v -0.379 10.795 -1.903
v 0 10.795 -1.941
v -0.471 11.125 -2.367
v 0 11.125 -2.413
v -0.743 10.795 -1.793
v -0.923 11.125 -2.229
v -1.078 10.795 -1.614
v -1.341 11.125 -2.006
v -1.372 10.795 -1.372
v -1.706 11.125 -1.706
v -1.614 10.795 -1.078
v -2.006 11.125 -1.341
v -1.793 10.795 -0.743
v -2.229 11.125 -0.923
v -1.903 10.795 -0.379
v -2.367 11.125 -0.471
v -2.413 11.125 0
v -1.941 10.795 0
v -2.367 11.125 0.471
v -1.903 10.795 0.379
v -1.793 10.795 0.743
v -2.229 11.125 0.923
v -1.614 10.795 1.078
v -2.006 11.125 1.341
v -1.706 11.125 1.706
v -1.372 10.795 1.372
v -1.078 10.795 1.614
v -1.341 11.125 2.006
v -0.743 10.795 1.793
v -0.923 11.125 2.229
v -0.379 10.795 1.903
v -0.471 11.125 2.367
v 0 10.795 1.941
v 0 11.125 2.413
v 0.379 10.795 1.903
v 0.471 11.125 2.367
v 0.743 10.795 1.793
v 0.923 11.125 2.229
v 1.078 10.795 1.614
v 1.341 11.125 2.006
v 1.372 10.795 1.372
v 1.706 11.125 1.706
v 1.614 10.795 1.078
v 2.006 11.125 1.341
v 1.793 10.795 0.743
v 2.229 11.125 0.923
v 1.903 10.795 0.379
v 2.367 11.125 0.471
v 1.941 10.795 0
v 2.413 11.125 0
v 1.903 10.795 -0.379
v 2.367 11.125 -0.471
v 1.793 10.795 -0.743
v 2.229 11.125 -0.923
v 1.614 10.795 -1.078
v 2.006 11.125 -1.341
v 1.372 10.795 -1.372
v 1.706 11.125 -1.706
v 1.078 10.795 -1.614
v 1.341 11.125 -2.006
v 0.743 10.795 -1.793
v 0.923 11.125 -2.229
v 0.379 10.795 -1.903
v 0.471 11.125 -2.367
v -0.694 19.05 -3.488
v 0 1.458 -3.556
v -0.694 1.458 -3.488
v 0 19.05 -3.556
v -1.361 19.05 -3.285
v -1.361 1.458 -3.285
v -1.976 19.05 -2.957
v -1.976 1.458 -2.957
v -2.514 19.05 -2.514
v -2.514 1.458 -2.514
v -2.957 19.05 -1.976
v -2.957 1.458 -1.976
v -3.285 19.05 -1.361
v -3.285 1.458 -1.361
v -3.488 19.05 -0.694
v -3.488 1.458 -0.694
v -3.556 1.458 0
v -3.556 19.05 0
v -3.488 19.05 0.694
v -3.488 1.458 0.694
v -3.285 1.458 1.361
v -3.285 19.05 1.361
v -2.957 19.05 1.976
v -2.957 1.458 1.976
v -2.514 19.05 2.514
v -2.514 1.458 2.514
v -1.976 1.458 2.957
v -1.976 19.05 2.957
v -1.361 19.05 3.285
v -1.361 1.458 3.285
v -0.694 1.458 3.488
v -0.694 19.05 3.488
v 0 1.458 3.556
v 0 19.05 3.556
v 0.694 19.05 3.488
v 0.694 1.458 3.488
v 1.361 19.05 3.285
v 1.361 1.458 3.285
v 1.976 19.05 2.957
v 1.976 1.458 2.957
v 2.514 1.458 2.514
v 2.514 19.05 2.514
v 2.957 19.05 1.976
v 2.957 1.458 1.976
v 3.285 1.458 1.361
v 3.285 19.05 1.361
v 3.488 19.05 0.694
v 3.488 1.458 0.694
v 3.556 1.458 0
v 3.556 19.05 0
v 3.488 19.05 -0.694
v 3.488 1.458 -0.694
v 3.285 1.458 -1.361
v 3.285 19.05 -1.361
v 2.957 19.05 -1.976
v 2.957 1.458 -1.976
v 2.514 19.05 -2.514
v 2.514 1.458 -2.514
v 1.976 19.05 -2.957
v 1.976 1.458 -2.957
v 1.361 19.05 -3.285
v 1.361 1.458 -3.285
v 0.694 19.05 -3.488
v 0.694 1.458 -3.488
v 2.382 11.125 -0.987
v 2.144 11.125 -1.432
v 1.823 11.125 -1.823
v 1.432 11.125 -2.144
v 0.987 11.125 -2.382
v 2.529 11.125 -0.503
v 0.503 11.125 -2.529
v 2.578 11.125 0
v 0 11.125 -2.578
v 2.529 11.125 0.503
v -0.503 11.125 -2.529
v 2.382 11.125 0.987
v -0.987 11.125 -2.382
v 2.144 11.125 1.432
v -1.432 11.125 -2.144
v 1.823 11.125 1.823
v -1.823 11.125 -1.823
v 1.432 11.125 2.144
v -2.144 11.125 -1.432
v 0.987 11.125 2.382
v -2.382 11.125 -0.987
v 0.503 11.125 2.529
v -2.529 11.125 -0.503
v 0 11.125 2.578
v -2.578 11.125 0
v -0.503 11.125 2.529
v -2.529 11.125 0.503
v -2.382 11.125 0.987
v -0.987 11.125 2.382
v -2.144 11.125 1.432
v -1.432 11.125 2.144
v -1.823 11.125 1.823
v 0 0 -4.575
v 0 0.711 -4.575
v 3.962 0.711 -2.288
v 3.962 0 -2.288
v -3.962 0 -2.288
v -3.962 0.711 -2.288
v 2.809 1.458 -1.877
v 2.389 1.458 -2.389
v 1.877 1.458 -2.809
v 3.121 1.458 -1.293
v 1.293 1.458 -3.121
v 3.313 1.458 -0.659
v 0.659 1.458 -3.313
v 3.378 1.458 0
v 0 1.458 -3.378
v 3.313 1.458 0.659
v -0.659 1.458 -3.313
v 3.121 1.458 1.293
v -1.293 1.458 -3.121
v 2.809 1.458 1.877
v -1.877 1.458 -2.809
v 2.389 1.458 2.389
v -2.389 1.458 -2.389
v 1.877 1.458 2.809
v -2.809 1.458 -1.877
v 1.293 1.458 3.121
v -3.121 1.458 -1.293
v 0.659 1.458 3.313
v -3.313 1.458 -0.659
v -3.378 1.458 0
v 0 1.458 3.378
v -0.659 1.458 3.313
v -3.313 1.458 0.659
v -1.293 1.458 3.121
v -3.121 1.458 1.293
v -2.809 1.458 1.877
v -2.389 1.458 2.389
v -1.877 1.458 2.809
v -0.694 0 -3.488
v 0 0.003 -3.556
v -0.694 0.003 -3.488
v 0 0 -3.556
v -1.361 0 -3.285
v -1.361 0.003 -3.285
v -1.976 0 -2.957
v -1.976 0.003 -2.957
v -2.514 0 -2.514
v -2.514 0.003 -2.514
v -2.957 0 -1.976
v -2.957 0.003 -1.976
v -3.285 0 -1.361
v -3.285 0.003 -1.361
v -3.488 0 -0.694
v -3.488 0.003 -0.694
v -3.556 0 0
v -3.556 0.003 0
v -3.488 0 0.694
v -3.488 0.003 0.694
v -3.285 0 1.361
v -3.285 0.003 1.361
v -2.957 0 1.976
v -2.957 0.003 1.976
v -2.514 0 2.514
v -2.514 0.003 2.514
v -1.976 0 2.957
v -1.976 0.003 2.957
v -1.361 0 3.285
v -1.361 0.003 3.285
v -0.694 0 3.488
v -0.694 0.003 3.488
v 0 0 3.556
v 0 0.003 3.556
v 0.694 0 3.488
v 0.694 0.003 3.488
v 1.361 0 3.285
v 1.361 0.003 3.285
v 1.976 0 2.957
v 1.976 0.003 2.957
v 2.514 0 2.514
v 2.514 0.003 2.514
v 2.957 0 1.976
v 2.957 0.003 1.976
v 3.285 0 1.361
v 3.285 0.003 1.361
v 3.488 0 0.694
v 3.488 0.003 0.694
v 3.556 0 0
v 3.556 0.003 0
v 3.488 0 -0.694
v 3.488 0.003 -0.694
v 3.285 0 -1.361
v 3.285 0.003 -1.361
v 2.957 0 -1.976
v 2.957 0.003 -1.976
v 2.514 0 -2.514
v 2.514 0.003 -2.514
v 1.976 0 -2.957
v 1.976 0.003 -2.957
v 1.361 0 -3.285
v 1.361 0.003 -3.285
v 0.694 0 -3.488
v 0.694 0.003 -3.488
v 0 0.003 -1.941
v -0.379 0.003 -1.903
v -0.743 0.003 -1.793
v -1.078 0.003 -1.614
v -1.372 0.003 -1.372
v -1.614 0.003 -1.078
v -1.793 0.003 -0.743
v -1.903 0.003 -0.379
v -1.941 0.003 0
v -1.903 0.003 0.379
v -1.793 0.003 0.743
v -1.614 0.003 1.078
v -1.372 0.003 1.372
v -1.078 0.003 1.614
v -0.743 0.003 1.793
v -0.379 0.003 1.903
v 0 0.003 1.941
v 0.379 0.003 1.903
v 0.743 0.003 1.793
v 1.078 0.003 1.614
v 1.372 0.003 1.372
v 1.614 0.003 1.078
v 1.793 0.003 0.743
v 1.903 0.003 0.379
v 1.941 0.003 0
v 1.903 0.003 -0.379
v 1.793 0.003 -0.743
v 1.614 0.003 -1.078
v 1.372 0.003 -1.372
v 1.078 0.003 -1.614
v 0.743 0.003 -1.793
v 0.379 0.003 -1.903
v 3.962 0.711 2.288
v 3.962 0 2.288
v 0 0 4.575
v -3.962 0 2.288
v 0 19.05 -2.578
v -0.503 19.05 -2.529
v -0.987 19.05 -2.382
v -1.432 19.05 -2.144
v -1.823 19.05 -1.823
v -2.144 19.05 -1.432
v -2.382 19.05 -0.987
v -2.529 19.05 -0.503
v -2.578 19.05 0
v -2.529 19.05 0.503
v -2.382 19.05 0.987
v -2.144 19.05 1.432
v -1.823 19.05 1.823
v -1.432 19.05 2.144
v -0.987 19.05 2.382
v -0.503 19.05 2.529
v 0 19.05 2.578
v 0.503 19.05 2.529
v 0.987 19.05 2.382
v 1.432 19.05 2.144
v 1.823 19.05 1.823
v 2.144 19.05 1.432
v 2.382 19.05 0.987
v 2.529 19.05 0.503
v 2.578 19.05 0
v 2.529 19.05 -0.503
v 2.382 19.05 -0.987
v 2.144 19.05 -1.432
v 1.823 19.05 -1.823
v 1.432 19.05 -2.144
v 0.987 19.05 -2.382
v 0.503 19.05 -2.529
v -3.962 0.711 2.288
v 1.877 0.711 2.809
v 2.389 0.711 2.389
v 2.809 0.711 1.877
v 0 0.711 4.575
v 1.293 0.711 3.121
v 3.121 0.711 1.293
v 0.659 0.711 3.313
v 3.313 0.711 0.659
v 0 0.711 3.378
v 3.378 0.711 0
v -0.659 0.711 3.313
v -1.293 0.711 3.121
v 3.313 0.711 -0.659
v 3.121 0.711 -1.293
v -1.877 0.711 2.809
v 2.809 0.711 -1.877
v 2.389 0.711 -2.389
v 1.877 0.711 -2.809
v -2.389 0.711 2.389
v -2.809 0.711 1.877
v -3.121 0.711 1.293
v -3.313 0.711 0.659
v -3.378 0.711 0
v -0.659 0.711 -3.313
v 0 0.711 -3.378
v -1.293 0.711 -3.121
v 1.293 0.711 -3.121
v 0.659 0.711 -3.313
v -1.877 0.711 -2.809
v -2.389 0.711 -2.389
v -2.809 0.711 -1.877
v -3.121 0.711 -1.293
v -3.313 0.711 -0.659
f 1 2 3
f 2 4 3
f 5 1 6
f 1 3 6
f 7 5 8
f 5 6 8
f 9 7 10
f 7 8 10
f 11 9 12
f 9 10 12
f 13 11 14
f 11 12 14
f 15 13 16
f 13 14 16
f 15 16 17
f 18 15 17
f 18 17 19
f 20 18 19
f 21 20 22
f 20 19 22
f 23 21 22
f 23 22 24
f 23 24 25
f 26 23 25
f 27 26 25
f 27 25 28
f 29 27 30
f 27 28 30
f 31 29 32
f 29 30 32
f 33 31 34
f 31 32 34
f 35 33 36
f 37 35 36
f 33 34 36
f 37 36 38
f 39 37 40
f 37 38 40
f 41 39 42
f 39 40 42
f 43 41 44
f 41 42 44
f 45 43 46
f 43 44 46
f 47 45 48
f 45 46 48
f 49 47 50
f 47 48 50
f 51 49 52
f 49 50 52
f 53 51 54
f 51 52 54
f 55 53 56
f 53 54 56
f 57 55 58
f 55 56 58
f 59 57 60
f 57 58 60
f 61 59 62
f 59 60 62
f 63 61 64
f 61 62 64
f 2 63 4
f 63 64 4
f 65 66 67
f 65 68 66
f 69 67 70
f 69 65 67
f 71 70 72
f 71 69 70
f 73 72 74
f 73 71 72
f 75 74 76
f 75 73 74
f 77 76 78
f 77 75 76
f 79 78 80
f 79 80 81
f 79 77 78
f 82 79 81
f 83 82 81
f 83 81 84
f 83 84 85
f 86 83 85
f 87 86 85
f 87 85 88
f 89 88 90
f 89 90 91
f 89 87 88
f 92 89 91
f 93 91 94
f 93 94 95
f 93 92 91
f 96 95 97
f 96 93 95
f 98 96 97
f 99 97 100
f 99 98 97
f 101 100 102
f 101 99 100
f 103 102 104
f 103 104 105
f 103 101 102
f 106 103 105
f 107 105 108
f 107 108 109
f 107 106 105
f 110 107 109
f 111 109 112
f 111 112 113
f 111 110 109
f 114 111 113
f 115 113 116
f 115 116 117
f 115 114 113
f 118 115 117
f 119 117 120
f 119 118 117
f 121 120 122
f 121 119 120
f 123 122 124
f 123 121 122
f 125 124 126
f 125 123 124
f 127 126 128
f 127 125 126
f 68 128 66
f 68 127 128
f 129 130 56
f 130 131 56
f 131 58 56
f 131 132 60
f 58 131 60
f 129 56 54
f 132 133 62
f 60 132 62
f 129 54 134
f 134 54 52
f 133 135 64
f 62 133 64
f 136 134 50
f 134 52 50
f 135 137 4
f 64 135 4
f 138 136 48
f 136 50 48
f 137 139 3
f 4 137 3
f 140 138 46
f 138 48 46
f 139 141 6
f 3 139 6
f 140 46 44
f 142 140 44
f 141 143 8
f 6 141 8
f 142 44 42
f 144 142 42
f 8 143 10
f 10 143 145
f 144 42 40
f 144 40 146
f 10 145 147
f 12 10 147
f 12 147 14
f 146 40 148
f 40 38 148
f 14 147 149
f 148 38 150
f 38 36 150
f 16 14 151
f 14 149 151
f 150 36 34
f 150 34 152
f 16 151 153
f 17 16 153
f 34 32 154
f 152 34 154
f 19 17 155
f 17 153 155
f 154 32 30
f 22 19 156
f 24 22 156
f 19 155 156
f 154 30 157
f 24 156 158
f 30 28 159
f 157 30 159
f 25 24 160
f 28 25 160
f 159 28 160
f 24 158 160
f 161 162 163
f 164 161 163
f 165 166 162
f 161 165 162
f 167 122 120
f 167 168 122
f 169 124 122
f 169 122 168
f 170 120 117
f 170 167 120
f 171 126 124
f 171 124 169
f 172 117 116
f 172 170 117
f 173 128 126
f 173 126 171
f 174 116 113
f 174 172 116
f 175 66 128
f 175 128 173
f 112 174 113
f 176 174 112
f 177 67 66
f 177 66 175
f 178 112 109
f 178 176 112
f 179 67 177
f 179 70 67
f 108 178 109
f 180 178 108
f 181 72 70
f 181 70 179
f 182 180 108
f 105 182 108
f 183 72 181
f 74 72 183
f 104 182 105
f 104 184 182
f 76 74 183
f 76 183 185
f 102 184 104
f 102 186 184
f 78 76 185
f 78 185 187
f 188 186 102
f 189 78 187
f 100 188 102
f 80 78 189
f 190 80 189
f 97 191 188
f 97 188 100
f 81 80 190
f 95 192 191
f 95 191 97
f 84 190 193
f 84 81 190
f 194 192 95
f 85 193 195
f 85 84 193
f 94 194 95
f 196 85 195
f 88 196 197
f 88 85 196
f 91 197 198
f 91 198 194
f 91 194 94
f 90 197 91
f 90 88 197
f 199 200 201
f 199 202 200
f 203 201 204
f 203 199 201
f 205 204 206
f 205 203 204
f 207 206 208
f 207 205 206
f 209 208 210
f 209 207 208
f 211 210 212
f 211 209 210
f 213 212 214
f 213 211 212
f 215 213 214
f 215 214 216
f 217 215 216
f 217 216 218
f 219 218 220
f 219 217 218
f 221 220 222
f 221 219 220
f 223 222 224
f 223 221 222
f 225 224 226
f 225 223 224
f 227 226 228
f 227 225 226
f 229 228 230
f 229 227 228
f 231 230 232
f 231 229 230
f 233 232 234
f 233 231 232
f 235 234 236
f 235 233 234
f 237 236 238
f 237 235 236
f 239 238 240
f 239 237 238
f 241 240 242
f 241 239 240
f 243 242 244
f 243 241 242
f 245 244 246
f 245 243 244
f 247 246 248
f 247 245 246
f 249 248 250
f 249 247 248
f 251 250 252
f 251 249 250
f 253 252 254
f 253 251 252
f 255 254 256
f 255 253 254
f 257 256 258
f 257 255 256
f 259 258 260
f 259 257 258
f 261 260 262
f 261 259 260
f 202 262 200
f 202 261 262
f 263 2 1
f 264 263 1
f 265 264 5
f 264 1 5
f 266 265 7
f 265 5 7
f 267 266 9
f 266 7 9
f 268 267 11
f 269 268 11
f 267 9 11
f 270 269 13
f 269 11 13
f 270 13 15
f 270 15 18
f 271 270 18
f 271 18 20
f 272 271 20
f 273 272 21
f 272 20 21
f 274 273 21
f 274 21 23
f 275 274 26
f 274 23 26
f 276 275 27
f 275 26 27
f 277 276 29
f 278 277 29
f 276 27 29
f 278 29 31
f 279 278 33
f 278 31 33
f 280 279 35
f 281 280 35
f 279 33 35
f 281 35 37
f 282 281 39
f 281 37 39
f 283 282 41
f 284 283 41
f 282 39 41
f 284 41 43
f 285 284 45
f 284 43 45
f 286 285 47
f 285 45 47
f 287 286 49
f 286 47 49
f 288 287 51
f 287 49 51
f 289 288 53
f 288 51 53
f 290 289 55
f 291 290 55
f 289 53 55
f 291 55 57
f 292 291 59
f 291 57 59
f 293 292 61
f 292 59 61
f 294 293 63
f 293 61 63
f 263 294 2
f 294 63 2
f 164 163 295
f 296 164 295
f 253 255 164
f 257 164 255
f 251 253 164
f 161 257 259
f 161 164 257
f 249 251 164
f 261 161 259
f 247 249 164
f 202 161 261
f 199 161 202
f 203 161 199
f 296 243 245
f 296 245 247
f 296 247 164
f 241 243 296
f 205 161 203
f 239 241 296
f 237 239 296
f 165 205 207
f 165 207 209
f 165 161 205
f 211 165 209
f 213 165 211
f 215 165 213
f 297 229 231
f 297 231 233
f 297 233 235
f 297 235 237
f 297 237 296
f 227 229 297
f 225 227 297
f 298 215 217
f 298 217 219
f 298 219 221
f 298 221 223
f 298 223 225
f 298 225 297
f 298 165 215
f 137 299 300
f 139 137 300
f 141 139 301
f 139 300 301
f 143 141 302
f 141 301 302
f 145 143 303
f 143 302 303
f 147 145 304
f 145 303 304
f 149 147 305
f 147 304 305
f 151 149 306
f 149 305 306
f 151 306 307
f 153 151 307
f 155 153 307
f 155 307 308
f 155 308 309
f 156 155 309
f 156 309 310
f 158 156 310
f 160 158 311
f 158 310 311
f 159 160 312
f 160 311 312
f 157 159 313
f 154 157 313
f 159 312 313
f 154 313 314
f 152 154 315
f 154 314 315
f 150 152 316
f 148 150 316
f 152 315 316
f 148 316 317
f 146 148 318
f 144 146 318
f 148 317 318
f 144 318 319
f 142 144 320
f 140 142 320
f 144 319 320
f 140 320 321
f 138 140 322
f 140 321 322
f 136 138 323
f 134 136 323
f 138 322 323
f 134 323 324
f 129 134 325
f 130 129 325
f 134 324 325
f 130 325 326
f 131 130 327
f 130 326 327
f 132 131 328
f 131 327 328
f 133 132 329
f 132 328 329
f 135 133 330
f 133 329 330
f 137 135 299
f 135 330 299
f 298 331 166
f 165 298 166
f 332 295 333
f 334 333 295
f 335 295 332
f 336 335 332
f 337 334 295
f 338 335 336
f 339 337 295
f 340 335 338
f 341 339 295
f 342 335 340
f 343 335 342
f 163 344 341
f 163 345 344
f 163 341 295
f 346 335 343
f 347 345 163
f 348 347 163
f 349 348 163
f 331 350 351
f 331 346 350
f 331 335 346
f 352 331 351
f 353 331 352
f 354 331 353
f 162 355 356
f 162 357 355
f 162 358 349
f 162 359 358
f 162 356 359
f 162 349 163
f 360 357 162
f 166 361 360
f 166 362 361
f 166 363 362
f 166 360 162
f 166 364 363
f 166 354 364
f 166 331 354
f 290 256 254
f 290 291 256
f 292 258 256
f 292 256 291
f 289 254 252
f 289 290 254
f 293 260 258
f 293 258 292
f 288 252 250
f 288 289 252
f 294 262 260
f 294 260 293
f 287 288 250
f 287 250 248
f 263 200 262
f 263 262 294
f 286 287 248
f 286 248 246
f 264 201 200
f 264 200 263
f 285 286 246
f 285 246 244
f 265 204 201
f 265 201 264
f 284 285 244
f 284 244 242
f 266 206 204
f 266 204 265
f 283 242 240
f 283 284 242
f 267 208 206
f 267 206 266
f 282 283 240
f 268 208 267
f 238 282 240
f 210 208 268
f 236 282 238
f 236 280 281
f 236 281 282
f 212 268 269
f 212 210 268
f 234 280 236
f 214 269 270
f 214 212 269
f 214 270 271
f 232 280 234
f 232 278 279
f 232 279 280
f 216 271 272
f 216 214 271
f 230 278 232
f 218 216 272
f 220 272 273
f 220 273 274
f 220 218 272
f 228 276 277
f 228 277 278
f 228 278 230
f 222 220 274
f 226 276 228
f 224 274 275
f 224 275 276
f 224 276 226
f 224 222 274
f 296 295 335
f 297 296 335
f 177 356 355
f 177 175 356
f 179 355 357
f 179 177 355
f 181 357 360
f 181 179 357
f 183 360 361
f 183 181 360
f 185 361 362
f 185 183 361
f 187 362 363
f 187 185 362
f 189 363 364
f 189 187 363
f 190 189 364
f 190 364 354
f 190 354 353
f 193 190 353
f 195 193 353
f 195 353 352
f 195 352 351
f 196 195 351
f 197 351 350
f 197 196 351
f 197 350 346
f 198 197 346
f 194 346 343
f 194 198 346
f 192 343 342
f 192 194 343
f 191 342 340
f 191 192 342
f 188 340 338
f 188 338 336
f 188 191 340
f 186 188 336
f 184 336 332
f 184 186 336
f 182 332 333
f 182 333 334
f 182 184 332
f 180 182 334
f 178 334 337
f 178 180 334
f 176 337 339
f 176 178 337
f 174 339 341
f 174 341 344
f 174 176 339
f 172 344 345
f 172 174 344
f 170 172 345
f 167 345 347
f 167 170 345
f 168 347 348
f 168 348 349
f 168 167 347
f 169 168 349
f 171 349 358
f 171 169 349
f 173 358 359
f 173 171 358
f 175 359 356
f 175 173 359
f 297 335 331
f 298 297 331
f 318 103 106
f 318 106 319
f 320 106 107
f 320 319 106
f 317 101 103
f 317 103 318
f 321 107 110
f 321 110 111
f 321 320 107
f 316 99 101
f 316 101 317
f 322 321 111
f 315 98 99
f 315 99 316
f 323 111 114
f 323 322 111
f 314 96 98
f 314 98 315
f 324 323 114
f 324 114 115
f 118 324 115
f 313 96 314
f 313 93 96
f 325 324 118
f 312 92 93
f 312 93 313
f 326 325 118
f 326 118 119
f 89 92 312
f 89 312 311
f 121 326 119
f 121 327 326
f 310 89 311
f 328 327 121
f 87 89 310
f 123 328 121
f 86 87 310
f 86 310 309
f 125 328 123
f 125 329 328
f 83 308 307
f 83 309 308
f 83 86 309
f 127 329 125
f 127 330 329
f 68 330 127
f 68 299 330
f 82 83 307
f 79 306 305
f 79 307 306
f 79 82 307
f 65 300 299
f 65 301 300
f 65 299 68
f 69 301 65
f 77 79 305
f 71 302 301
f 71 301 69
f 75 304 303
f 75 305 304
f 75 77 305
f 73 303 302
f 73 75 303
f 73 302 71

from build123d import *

# Parameters (mm, degrees)
HEXDIESKE_R  = 4.609084
HEXDIE_DEPTH = 0.7112


with BuildPart() as part:
    # BodySke → Body (revolve)
    with BuildSketch(Plane.XY, mode=Mode.PRIVATE) as body_sk:
        Polygon((3.556, 0), (4.596384, 0), (4.596384, 0.7112), (3.3782, 0.7112), (3.3782, 1.45796), (3.556, 1.45796), (3.556, 19.05), (1.94056, 19.05), (1.94056, 0.00508), (0, 0.00508), (0, 0.00254), (3.556, 0.00254), align=None)
    revolve(body_sk.sketch.rotate(Axis((0, 0, 0), (0, 1, 0)), 90), axis=Axis((0, 0, 0), (0, 1, 0)))

    # TapDriSke → TapDrill (revolve, cut)
    with BuildSketch(Plane.XY, mode=Mode.PRIVATE) as tapdrill_sk:
        Polygon((1.94056, -3.95732), (1.94056, 19.05), (0, 19.05), (0, -4.761126271), align=None)
    revolve(tapdrill_sk.sketch.rotate(Axis((0, 0, 0), (0, 1, 0)), 90), axis=Axis((0, 0, 0), (0, 1, 0)), mode=Mode.SUBTRACT)

    # EndChamferSke → EndChamfer (revolve, cut)
    with BuildSketch(Plane.XY, mode=Mode.PRIVATE) as endchamfer_sk:
        Polygon((2.5781, 11.1252), (2.5781, 19.304), (1.94056, 19.304), (1.94056, 10.79451682), (2.413, 11.1252), align=None)
    revolve(endchamfer_sk.sketch.rotate(Axis((0, -2.54, 0), (0, 1, 0)), 90), axis=Axis((0, -2.54, 0), (0, 1, 0)), mode=Mode.SUBTRACT)

    # HexDieSke → HexDie (cut)
    with BuildSketch(Plane(origin=(0, 0.7112, 0), x_dir=(-1, 0, 0), z_dir=(0, 1, 0))):
        Circle(HEXDIESKE_R)
        Polygon((0, 4.575385413), (3.9624, 2.287692707), (3.9624, -2.287692707), (0, -4.575385413), (-3.9624, -2.287692707), (-3.9624, 2.287692707), align=None, mode=Mode.SUBTRACT)
    extrude(amount=-HEXDIE_DEPTH, mode=Mode.SUBTRACT)


solid = part.part
